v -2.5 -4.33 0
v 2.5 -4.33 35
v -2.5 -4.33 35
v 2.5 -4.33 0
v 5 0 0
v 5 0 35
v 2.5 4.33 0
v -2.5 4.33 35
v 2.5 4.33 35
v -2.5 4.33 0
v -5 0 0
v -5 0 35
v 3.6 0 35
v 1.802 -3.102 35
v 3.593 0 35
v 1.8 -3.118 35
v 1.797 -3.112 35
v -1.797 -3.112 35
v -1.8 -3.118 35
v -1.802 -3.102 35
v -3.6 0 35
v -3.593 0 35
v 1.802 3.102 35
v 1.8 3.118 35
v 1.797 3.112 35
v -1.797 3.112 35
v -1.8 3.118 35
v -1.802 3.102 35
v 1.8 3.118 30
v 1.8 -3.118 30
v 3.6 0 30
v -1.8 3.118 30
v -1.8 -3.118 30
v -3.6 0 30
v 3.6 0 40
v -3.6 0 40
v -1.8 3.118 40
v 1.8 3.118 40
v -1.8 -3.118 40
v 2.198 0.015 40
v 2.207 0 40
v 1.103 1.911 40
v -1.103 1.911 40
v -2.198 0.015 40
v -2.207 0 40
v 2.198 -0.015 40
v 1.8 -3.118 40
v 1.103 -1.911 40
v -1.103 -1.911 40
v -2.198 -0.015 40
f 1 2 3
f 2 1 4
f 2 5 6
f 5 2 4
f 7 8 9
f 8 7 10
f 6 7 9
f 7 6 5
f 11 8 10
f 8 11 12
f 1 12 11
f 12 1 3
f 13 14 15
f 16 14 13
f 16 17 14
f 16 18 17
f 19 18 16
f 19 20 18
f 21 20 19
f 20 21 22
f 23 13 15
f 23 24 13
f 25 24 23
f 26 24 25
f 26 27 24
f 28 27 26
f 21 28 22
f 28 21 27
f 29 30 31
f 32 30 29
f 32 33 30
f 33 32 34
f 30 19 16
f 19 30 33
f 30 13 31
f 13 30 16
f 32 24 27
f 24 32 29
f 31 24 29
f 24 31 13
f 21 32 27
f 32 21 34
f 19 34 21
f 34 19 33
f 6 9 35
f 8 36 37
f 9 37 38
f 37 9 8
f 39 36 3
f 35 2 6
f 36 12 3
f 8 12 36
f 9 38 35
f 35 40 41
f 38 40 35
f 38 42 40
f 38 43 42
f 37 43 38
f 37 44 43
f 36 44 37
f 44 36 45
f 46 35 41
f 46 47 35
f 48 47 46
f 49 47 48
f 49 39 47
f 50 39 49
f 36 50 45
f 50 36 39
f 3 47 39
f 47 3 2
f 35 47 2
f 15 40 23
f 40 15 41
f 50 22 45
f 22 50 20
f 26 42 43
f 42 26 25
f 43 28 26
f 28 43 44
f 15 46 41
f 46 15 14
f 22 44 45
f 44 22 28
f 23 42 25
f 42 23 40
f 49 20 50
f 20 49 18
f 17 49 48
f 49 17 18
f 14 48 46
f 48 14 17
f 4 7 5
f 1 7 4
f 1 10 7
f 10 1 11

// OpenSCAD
//------------------------------------------------
//-- Touch pen.
//-- (c) Juan Gonzalez-Gomez (Obijuan). Nov-2013
//------------------------------------------------
// Released under the GPL v3 license
//------------------------------------------------

//-------------- Pen parameters
pen_diam = 10;        //-- outer diameter
pen_tip_th = 1.4;     //-- Pen tip thickness
pen_tip_base_h = 5;   //-- Tip base height
pen_tip_h = 5;        //-- Pen tip height
pen_body_h = 30;      //-- Pen body height



//--------------------------------------------------
extra = 5;


//--- Pen tip base
//color("green")
translate([0,0,pen_tip_base_h/2 + pen_body_h])
difference() {
  cylinder(r = pen_diam/2, h = pen_tip_base_h, center = true, $fn = 6);
  cylinder(r = pen_diam/2 - pen_tip_th, h = pen_tip_base_h + extra, center = true, $fn = 6);
}


//-- pen tip
translate([0,0, pen_tip_h/2 + pen_tip_base_h + pen_body_h])
difference() {
  cylinder(r1 = pen_diam/2, r2 = pen_diam/2 - pen_tip_th, h = pen_tip_h, center = true, $fn = 6);
  cylinder(r1 = pen_diam/2 - pen_tip_th, r2 = pen_diam/2 - 2*pen_tip_th, h = pen_tip_h + 0.05, center = true, $fn = 6);
}
         

//-- Pen body
//color("Blue")
translate([0,0,pen_body_h/2])
  cylinder(r = pen_diam/2, h = pen_body_h, center = true, $fn = 6);
